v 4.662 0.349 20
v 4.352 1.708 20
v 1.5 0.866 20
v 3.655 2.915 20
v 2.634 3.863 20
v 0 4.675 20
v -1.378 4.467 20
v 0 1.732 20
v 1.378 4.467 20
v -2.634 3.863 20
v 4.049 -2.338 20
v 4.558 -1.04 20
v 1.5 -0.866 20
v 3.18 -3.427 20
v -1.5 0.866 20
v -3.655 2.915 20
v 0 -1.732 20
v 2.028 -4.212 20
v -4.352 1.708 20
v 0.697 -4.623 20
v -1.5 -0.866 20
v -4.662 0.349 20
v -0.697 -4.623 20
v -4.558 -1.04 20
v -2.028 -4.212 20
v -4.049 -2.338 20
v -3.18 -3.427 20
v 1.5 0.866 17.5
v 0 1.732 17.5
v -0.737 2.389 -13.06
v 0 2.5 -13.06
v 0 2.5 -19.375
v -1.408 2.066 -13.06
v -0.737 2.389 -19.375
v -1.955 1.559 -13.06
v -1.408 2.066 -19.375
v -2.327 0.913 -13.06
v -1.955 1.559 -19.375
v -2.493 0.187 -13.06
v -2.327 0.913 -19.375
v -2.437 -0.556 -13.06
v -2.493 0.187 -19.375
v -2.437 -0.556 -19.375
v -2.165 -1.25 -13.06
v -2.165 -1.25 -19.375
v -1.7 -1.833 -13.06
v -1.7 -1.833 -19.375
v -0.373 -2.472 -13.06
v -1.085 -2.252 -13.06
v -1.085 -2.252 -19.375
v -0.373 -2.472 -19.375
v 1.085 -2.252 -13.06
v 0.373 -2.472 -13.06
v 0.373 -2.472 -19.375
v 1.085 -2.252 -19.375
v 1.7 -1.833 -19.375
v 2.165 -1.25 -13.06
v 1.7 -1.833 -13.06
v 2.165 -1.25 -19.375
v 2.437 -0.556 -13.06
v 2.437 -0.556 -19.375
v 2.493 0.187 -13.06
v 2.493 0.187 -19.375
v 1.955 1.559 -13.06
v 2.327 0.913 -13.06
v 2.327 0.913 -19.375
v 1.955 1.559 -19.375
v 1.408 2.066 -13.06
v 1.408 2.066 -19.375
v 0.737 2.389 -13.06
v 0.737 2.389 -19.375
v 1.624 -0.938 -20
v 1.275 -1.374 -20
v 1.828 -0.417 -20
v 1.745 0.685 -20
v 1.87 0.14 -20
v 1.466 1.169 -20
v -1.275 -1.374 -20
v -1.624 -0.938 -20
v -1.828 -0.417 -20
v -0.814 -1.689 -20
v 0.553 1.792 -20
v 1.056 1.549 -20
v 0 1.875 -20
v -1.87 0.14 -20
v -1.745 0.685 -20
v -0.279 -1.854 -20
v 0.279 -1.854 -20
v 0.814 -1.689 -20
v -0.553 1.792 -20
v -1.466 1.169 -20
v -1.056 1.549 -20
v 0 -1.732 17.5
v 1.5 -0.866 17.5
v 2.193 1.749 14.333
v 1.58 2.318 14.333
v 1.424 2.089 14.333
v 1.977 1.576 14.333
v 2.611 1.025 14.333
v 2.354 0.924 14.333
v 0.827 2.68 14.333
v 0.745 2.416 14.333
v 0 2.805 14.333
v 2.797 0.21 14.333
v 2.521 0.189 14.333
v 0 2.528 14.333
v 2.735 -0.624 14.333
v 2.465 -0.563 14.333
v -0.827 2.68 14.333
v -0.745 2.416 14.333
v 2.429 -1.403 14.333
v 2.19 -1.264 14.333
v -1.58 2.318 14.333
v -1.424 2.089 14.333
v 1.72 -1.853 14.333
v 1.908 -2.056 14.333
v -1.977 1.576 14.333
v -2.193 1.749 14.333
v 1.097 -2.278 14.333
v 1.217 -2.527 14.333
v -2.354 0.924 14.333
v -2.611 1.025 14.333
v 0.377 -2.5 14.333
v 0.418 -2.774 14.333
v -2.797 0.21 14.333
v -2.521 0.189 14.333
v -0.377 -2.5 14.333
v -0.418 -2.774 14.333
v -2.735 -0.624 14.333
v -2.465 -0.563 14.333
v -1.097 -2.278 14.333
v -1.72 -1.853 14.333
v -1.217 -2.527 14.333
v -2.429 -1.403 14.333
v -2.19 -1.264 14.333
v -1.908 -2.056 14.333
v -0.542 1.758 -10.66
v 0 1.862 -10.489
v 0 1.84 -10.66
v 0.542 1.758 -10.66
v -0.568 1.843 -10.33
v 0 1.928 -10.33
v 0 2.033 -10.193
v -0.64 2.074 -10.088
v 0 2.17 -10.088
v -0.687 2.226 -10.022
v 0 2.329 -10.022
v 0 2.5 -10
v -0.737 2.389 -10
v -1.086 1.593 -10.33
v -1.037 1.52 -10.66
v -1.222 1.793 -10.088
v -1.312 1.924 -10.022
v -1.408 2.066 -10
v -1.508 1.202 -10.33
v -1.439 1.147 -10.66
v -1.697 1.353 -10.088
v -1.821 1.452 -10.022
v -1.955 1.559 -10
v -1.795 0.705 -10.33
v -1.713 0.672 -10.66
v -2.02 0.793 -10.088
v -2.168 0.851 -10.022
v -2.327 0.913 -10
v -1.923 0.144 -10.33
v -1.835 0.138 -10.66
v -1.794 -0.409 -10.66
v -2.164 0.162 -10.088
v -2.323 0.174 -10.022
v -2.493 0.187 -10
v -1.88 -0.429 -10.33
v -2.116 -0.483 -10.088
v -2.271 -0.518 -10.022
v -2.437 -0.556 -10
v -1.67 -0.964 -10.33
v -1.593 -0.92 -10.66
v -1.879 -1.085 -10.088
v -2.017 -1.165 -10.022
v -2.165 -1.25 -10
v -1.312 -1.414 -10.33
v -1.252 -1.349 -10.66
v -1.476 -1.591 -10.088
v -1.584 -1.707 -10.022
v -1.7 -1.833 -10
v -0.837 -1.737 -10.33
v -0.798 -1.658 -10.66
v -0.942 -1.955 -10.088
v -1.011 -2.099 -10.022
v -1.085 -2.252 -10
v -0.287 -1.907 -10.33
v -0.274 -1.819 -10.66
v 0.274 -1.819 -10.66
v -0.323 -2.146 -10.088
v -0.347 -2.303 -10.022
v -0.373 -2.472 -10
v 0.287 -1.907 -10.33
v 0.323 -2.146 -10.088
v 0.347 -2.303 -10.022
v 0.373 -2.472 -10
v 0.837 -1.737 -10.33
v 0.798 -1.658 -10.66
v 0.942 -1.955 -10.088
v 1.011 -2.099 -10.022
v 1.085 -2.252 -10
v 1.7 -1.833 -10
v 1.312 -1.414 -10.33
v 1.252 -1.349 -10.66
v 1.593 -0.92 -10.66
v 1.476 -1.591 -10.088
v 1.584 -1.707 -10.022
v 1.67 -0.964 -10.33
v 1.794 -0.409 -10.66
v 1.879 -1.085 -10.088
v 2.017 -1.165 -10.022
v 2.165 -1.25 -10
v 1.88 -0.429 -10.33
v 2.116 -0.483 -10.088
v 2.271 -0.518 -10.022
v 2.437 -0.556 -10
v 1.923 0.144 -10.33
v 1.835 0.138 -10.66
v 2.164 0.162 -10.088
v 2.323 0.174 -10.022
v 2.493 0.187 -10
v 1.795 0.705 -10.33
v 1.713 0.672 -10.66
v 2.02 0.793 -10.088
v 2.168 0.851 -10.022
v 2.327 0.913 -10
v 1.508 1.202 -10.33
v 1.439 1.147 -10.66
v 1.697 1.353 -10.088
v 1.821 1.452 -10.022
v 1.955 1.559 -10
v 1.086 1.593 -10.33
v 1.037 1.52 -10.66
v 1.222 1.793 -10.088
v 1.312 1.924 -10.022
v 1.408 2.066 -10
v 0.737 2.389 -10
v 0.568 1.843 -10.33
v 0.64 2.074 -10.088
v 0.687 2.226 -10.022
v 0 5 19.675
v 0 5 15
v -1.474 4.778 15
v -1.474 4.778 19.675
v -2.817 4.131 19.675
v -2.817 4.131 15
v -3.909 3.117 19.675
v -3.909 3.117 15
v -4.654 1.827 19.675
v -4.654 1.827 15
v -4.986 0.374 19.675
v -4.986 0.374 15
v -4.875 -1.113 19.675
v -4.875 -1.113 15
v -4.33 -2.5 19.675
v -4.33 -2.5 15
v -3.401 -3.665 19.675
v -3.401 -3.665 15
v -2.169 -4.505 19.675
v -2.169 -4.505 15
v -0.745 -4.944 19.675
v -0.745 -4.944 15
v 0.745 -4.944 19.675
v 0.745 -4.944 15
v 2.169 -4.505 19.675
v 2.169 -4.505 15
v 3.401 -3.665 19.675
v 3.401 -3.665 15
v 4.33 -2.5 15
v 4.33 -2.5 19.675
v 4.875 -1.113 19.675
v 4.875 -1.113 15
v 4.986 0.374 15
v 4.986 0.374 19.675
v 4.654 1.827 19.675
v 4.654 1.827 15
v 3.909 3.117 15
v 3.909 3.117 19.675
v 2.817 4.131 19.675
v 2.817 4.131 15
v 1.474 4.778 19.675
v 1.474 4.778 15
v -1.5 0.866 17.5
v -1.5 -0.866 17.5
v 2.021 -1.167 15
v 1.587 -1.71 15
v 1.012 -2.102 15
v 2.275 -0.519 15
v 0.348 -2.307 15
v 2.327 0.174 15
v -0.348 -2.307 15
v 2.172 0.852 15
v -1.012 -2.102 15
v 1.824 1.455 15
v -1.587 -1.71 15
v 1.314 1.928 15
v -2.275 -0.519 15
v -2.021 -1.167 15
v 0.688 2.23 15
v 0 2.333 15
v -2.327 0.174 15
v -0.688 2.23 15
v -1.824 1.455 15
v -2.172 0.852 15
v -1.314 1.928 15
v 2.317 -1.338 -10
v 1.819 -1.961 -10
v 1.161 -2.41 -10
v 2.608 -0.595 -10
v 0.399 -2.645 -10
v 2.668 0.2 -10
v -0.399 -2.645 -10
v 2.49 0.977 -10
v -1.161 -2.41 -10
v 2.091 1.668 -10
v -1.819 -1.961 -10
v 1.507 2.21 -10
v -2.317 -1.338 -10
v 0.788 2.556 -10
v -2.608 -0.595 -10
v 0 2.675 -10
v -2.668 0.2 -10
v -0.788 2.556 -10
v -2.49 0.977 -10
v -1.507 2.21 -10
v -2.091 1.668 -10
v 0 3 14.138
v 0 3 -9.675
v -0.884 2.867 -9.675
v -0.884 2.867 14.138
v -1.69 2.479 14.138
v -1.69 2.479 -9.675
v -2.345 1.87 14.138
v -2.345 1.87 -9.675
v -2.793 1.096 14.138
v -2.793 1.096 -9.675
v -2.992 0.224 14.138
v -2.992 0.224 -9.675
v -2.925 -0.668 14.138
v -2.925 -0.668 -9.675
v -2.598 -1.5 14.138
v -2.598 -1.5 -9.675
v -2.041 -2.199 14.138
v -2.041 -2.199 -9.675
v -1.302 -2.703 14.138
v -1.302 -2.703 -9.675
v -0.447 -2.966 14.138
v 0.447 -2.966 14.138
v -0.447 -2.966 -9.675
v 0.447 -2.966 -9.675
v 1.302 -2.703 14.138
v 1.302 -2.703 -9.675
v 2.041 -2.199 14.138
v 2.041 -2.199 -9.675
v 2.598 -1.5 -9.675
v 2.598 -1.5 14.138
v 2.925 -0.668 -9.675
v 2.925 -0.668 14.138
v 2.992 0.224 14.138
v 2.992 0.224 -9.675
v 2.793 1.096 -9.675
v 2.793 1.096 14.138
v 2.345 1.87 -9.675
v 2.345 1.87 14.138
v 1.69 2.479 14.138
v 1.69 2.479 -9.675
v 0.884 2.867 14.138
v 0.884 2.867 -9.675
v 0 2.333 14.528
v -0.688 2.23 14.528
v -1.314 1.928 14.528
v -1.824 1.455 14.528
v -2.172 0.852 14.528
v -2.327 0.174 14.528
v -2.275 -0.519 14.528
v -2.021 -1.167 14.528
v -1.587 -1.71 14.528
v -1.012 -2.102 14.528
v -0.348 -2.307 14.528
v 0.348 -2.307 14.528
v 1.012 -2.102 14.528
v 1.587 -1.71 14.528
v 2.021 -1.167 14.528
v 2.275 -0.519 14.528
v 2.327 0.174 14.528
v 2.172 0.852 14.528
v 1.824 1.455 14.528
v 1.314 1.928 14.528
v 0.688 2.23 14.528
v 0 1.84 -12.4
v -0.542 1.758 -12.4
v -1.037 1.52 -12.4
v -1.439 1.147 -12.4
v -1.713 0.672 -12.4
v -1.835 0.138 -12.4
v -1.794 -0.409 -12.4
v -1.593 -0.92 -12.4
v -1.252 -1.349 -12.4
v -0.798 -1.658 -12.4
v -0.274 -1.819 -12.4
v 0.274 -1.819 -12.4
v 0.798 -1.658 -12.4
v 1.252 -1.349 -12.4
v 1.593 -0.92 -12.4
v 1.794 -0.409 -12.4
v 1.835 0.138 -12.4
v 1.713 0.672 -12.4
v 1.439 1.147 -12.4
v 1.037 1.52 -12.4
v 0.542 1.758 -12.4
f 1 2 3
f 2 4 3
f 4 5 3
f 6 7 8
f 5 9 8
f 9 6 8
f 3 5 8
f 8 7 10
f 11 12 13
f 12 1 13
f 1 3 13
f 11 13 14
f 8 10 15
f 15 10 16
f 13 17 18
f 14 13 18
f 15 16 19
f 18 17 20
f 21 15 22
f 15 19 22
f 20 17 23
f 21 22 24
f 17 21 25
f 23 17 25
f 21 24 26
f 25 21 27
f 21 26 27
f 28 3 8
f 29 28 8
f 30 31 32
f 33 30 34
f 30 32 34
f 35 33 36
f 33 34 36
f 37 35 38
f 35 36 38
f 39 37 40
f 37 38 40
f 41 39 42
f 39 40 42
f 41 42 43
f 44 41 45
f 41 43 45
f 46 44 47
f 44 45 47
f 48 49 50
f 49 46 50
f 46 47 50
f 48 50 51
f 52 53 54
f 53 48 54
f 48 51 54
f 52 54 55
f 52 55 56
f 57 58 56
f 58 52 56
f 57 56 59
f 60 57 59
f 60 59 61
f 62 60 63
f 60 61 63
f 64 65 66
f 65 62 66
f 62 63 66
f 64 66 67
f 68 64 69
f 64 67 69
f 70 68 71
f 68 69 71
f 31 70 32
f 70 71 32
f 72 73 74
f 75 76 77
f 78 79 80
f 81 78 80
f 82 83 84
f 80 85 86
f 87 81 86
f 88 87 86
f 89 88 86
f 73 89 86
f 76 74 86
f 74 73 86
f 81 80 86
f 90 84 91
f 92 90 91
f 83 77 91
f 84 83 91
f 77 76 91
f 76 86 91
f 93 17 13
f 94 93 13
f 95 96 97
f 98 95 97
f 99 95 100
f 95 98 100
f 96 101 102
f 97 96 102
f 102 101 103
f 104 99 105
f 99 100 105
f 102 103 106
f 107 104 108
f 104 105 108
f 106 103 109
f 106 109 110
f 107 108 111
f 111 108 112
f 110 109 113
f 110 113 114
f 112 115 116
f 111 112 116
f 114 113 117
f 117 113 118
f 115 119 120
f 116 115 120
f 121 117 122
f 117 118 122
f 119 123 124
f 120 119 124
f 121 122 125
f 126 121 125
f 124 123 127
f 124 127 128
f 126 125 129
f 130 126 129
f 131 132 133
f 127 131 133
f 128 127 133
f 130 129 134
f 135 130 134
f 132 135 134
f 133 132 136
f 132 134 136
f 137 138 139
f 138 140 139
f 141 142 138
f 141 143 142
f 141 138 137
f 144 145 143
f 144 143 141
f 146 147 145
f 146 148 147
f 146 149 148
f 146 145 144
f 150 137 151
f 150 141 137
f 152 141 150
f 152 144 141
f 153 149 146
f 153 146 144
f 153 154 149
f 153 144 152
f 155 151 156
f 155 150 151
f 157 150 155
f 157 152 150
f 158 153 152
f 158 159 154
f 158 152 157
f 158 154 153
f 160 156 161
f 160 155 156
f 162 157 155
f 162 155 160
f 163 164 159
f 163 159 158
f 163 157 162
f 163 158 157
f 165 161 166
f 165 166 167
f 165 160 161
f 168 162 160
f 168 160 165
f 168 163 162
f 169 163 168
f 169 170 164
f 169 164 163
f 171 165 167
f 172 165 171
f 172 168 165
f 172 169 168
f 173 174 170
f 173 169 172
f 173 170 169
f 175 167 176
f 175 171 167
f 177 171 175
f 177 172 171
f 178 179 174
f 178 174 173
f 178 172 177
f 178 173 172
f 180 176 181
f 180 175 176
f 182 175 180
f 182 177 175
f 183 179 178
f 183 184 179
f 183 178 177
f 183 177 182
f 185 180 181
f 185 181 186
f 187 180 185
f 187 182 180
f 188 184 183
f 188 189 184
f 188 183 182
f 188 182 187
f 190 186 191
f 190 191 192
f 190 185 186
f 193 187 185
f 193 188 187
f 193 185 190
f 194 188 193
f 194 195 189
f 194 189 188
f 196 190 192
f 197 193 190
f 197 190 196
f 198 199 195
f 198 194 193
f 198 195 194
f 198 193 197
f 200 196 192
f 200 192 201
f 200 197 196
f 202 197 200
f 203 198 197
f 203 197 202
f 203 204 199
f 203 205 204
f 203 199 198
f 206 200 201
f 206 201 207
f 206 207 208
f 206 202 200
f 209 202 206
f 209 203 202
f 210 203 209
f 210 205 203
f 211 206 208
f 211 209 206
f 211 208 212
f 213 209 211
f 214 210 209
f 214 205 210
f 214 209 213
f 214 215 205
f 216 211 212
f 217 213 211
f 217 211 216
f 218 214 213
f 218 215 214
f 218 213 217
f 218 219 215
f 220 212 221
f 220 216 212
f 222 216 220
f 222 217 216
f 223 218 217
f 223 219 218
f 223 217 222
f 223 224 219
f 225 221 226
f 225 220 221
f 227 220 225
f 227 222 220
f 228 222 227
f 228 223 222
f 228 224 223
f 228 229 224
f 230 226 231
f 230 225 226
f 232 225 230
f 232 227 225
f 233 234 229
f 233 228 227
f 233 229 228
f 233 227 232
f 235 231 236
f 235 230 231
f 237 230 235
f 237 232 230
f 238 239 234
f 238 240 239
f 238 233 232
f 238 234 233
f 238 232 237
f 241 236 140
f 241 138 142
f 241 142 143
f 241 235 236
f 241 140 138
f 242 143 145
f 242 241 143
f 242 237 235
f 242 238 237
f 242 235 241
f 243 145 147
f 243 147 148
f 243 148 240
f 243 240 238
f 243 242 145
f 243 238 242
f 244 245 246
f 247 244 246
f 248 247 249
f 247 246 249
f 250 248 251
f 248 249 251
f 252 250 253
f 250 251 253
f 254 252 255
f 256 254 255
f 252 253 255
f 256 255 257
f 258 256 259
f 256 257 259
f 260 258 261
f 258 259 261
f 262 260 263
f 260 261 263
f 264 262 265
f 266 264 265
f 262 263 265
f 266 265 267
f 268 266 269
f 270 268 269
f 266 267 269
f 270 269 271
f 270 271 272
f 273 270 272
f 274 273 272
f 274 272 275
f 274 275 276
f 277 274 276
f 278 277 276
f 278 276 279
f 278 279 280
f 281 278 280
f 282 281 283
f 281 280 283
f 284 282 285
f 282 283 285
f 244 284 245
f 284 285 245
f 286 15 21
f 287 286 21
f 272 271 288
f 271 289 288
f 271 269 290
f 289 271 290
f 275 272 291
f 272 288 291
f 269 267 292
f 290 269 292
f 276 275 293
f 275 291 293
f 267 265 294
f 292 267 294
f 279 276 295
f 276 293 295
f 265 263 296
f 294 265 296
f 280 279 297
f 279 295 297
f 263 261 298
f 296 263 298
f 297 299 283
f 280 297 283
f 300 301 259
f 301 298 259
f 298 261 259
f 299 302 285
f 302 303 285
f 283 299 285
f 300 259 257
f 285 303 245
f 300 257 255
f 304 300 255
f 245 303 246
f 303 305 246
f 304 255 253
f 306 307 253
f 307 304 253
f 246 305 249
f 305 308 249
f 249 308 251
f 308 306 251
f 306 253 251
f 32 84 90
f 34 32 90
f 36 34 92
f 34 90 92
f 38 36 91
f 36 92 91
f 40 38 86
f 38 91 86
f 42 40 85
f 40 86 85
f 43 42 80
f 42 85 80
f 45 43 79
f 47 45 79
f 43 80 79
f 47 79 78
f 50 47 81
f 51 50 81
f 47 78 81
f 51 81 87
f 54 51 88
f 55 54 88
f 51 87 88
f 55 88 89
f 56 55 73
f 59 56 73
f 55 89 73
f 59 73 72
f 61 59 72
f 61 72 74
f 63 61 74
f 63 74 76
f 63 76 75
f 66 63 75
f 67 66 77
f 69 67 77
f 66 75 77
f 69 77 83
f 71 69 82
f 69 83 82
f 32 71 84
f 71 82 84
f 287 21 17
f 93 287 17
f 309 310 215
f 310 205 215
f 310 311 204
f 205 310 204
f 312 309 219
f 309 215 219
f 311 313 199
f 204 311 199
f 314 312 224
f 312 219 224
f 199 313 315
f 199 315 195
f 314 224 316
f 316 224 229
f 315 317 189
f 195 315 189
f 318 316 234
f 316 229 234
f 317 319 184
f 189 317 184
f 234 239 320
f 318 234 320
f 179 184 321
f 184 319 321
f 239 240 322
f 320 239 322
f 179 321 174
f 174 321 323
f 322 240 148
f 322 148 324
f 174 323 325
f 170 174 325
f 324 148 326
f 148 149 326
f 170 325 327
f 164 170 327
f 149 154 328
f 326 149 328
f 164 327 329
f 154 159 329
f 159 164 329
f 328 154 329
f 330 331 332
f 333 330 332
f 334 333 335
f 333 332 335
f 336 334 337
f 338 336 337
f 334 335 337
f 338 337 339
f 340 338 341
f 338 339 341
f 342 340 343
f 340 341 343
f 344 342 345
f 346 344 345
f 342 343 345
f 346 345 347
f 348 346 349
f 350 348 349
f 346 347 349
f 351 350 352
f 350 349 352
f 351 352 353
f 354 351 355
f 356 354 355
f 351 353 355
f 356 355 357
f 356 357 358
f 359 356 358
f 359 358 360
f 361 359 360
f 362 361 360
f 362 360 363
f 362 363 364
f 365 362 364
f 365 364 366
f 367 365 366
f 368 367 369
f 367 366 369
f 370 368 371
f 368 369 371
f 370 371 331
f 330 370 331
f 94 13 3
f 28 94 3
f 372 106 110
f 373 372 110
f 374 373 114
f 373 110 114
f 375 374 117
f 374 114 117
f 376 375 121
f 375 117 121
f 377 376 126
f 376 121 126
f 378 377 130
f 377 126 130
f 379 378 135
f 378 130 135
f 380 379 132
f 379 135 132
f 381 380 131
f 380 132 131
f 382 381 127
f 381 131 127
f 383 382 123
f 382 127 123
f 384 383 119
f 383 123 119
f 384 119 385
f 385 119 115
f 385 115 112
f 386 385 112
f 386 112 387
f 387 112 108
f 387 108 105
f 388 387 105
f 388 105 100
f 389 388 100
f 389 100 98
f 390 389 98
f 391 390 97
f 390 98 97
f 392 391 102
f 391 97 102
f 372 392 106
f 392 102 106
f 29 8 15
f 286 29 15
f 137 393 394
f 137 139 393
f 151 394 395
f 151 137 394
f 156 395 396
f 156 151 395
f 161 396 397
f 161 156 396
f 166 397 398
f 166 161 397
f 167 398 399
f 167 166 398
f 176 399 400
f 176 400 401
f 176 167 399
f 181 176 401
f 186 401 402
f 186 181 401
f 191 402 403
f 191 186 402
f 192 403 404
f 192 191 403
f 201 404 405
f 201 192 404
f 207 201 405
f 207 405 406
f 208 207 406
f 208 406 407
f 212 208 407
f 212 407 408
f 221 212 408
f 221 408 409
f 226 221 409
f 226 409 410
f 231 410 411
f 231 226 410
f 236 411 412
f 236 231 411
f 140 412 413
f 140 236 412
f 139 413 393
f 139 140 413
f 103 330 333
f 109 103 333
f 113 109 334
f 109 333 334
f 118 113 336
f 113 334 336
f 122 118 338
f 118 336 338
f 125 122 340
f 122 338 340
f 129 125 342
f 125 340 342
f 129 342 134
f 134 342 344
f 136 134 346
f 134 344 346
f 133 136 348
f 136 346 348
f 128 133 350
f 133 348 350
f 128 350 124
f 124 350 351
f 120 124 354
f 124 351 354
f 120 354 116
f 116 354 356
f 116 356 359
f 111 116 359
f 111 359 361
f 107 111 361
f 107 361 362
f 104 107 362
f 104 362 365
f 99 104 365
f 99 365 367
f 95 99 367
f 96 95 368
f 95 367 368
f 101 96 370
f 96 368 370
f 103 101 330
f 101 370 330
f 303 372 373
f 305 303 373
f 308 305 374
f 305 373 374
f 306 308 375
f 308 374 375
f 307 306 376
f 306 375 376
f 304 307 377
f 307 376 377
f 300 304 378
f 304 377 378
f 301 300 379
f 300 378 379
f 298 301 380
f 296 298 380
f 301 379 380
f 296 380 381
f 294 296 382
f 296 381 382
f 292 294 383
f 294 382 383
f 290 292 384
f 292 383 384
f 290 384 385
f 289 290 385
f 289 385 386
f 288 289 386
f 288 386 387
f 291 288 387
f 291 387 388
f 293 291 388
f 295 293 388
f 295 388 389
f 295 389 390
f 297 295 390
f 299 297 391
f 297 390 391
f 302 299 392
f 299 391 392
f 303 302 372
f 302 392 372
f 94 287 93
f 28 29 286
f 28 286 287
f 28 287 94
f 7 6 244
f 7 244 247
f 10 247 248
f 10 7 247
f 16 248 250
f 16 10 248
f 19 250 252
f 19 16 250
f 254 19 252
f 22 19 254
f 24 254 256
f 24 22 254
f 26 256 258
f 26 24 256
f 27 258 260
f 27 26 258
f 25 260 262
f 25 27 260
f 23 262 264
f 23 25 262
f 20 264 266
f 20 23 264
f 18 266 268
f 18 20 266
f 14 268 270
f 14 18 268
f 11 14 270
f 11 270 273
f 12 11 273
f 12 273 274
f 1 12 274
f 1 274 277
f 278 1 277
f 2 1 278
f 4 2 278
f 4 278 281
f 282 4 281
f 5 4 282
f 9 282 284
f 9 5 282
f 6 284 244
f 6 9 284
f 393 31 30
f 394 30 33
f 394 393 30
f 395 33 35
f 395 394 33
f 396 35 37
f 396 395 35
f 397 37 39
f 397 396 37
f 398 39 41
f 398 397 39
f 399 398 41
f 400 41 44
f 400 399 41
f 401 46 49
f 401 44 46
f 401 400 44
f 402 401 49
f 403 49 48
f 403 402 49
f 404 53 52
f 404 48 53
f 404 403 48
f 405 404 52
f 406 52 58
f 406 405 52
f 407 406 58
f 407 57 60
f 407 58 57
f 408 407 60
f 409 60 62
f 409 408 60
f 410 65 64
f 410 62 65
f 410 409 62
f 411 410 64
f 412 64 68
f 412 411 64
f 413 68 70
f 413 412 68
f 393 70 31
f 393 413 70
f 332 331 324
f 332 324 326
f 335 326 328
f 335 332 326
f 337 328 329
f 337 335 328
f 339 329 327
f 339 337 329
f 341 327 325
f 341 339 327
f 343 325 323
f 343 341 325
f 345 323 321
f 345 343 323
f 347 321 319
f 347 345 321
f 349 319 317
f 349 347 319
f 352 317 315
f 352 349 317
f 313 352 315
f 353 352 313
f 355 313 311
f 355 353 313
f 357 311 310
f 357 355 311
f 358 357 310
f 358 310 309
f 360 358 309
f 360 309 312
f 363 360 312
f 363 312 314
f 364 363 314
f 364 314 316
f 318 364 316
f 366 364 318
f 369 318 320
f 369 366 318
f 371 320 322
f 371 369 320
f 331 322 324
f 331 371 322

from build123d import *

# Parameters (mm, degrees)
SKETCH4_W          = 0.666666667
SKETCH4_H          = 0.666666667
CHAMFER1_SIZE      = 0.195
CHAMFER2_SIZE      = 0.625
CHAMFER3_SIZE      = 0.325
CUT_EXTRUDE1_DEPTH = 2.5


with BuildPart() as part:
    # Sketch3 → Revolve1 (revolve)
    with BuildSketch(Plane(origin=(0, 0, 0), x_dir=(0, 0, -1), z_dir=(1, 0, 0))):
        Polygon((-20, 5), (-15, 5), (-15, 3), (10, 3), (10, 2.5), (20, 2.5), (20, 0), (-20, 0), align=None)
    revolve(axis=Axis((0, 0, -20), (0, 0, 1)))

    # Sketch4 → Cut-Revolve1 (revolve, cut)
    with BuildSketch(Plane(origin=(0, 0, 0), x_dir=(0, 0, -1), z_dir=(1, 0, 0))):
        with Locations((-14.666666667, 2.666666667)):
            Rectangle(SKETCH4_W, SKETCH4_H)
    revolve(axis=Axis((0, 0, -20), (0, 0, 1)), mode=Mode.SUBTRACT)

    # Chamfer1
    chamfer1_edges = [part.edges().sort_by_distance(p)[0] for p in [
        (0, -2.333333333, 14.333333333),
        (0, -3, 14.333333333),
    ]]
    chamfer(chamfer1_edges, length=CHAMFER1_SIZE)

    # Sketch6 → Cut-Revolve2 (revolve, cut)
    with BuildSketch(Plane(origin=(0, 0, 0), x_dir=(0, 0, -1), z_dir=(1, 0, 0))):
        with BuildLine():
            Line((10, 3), (13.56, 3))
            Line((13.56, 3), (12.4, 1.84))
            Line((12.4, 1.84), (10.66, 1.84))
            ThreePointArc((10.66, 1.84), (10.193309524, 2.033309524), (10, 2.5))
            Line((10, 2.5), (10, 3))
        make_face()
    revolve(axis=Axis((0, 0, -20), (0, 0, 1)), mode=Mode.SUBTRACT)

    # Chamfer2
    chamfer2_edges = [part.edges().sort_by_distance(p)[0] for p in [
        (0, -2.5, -20),
    ]]
    chamfer(chamfer2_edges, length=CHAMFER2_SIZE)

    # Chamfer3
    chamfer3_edges = [part.edges().sort_by_distance(p)[0] for p in [
        (0, -3, -10),
        (0, -5, 20),
    ]]
    chamfer(chamfer3_edges, length=CHAMFER3_SIZE)

    # Sketch8 → Cut-Extrude1 (cut)
    with BuildSketch(Plane.XY.offset(20)):
        Polygon((1.5, 0.866025404), (0, 1.732050808), (-1.5, 0.866025404), (-1.5, -0.866025404), (0, -1.732050808), (1.5, -0.866025404), align=None)
    extrude(amount=-CUT_EXTRUDE1_DEPTH, mode=Mode.SUBTRACT)


solid = part.part
